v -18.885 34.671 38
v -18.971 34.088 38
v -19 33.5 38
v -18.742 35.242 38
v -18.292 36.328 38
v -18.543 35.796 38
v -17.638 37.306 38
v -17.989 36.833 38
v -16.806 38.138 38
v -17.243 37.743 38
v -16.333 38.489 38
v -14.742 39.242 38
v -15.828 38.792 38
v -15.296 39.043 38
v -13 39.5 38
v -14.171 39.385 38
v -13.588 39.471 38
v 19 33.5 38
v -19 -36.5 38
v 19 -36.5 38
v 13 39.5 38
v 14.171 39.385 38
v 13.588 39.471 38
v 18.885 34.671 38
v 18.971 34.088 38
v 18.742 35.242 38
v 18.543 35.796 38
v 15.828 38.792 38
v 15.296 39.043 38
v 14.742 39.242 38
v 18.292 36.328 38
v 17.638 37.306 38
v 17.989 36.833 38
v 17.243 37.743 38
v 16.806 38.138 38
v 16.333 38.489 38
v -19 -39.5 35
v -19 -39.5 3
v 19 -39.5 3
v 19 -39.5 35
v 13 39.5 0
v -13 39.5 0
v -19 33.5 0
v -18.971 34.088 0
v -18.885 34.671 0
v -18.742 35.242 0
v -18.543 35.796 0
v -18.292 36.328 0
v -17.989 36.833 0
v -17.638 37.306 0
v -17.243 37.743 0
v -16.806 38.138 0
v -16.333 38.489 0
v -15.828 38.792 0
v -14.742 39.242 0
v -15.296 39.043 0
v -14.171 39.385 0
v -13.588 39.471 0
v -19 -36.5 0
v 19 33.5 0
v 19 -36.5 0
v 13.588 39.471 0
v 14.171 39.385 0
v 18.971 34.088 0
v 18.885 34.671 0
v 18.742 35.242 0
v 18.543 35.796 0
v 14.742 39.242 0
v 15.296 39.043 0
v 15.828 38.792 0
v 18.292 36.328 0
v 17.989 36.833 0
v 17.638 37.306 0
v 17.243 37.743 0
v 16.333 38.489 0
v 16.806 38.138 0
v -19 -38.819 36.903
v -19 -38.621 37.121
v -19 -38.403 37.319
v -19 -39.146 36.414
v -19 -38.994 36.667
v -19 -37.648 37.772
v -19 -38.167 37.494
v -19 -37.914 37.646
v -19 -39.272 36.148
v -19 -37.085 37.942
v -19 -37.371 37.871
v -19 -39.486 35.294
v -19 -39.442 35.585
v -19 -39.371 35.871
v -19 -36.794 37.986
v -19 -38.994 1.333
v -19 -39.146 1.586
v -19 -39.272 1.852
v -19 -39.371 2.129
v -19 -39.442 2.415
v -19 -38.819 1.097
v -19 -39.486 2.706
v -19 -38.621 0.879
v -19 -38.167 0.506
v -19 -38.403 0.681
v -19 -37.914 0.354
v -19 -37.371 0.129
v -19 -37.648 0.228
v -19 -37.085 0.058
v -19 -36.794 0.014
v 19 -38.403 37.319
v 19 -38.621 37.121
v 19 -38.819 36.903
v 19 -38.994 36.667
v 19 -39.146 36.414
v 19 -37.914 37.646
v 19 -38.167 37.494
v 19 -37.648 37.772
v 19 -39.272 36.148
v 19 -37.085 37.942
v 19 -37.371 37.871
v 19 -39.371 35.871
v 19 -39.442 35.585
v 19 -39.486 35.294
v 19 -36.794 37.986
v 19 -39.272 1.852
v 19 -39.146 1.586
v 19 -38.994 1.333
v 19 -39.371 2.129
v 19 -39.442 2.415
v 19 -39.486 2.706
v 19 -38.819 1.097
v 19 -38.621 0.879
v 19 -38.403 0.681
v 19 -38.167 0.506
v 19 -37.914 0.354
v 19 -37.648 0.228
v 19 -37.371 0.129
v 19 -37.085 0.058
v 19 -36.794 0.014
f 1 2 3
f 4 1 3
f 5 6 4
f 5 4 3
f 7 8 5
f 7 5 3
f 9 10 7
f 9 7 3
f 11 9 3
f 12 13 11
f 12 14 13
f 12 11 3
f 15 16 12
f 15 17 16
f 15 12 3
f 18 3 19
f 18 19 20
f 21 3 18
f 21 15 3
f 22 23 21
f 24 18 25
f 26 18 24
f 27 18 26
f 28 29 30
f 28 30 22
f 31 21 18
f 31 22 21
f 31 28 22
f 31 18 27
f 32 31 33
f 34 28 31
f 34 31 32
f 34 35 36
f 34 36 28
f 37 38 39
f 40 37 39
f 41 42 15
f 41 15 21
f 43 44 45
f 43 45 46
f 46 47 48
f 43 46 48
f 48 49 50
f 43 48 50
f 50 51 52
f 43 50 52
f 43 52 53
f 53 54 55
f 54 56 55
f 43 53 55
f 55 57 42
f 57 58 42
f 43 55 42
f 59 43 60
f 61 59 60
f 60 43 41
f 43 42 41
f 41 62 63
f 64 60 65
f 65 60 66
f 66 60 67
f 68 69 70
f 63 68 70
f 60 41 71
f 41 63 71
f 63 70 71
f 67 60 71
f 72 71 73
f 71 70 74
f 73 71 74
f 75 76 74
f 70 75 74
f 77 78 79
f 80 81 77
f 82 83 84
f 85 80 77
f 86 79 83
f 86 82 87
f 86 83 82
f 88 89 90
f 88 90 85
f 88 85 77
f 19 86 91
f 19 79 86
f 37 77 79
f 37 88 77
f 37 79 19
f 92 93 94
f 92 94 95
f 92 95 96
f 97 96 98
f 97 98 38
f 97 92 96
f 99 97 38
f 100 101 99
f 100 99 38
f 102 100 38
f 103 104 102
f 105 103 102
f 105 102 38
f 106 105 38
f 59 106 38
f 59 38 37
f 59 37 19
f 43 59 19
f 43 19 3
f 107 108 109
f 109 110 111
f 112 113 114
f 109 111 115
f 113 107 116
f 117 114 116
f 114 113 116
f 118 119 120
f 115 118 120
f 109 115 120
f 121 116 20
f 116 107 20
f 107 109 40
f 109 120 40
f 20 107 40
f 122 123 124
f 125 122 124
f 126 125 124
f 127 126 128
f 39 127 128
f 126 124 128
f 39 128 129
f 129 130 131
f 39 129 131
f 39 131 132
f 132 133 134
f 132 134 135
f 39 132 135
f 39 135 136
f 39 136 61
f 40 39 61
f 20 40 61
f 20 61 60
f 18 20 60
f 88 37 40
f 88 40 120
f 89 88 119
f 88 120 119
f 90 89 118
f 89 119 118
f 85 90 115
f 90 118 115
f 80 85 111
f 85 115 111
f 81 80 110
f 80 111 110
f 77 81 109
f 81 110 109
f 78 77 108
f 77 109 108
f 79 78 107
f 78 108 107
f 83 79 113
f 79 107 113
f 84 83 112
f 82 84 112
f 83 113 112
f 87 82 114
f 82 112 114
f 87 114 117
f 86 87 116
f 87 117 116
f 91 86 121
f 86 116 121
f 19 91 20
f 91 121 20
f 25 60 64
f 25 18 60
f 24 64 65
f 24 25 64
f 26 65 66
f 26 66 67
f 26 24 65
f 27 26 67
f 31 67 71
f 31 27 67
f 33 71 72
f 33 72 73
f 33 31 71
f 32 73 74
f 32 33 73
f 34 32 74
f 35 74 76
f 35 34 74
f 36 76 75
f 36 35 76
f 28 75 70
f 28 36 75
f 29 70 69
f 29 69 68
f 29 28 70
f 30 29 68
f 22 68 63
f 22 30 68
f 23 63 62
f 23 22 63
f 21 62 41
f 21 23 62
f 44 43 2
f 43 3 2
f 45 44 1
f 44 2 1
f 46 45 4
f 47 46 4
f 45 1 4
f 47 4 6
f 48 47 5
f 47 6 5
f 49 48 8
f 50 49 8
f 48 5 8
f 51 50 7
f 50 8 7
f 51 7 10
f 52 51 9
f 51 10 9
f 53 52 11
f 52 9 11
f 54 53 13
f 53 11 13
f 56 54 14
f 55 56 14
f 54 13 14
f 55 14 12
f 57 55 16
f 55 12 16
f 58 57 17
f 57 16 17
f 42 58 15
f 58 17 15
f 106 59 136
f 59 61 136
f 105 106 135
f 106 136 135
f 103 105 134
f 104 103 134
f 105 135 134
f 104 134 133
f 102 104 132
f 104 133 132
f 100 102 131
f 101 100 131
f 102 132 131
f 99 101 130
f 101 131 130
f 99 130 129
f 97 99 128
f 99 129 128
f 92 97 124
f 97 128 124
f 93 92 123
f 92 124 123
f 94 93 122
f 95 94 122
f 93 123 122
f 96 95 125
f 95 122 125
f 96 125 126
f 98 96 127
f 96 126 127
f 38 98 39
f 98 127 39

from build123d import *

# Parameters (mm, degrees)
SKETCH1_W           = 38
SKETCH1_H           = 79
BOSS_EXTRUDE1_DEPTH = 38
FILLET1_R           = 6
FILLET2_R           = 3


with BuildPart() as part:
    # Sketch1 → Boss-Extrude1 (new body)
    with BuildSketch(Plane.XY):
        Rectangle(SKETCH1_W, SKETCH1_H)
    extrude(amount=BOSS_EXTRUDE1_DEPTH)

    # Fillet1
    fillet1_edges = [part.edges().sort_by_distance(p)[0] for p in [
        (-19, 39.5, 19),
        (19, 39.5, 19),
    ]]
    fillet(fillet1_edges, radius=FILLET1_R)

    # Fillet2
    fillet2_edges = [part.edges().sort_by_distance(p)[0] for p in [
        (0, -39.5, 38),
        (0, -39.5, 0),
    ]]
    fillet(fillet2_edges, radius=FILLET2_R)


solid = part.part
